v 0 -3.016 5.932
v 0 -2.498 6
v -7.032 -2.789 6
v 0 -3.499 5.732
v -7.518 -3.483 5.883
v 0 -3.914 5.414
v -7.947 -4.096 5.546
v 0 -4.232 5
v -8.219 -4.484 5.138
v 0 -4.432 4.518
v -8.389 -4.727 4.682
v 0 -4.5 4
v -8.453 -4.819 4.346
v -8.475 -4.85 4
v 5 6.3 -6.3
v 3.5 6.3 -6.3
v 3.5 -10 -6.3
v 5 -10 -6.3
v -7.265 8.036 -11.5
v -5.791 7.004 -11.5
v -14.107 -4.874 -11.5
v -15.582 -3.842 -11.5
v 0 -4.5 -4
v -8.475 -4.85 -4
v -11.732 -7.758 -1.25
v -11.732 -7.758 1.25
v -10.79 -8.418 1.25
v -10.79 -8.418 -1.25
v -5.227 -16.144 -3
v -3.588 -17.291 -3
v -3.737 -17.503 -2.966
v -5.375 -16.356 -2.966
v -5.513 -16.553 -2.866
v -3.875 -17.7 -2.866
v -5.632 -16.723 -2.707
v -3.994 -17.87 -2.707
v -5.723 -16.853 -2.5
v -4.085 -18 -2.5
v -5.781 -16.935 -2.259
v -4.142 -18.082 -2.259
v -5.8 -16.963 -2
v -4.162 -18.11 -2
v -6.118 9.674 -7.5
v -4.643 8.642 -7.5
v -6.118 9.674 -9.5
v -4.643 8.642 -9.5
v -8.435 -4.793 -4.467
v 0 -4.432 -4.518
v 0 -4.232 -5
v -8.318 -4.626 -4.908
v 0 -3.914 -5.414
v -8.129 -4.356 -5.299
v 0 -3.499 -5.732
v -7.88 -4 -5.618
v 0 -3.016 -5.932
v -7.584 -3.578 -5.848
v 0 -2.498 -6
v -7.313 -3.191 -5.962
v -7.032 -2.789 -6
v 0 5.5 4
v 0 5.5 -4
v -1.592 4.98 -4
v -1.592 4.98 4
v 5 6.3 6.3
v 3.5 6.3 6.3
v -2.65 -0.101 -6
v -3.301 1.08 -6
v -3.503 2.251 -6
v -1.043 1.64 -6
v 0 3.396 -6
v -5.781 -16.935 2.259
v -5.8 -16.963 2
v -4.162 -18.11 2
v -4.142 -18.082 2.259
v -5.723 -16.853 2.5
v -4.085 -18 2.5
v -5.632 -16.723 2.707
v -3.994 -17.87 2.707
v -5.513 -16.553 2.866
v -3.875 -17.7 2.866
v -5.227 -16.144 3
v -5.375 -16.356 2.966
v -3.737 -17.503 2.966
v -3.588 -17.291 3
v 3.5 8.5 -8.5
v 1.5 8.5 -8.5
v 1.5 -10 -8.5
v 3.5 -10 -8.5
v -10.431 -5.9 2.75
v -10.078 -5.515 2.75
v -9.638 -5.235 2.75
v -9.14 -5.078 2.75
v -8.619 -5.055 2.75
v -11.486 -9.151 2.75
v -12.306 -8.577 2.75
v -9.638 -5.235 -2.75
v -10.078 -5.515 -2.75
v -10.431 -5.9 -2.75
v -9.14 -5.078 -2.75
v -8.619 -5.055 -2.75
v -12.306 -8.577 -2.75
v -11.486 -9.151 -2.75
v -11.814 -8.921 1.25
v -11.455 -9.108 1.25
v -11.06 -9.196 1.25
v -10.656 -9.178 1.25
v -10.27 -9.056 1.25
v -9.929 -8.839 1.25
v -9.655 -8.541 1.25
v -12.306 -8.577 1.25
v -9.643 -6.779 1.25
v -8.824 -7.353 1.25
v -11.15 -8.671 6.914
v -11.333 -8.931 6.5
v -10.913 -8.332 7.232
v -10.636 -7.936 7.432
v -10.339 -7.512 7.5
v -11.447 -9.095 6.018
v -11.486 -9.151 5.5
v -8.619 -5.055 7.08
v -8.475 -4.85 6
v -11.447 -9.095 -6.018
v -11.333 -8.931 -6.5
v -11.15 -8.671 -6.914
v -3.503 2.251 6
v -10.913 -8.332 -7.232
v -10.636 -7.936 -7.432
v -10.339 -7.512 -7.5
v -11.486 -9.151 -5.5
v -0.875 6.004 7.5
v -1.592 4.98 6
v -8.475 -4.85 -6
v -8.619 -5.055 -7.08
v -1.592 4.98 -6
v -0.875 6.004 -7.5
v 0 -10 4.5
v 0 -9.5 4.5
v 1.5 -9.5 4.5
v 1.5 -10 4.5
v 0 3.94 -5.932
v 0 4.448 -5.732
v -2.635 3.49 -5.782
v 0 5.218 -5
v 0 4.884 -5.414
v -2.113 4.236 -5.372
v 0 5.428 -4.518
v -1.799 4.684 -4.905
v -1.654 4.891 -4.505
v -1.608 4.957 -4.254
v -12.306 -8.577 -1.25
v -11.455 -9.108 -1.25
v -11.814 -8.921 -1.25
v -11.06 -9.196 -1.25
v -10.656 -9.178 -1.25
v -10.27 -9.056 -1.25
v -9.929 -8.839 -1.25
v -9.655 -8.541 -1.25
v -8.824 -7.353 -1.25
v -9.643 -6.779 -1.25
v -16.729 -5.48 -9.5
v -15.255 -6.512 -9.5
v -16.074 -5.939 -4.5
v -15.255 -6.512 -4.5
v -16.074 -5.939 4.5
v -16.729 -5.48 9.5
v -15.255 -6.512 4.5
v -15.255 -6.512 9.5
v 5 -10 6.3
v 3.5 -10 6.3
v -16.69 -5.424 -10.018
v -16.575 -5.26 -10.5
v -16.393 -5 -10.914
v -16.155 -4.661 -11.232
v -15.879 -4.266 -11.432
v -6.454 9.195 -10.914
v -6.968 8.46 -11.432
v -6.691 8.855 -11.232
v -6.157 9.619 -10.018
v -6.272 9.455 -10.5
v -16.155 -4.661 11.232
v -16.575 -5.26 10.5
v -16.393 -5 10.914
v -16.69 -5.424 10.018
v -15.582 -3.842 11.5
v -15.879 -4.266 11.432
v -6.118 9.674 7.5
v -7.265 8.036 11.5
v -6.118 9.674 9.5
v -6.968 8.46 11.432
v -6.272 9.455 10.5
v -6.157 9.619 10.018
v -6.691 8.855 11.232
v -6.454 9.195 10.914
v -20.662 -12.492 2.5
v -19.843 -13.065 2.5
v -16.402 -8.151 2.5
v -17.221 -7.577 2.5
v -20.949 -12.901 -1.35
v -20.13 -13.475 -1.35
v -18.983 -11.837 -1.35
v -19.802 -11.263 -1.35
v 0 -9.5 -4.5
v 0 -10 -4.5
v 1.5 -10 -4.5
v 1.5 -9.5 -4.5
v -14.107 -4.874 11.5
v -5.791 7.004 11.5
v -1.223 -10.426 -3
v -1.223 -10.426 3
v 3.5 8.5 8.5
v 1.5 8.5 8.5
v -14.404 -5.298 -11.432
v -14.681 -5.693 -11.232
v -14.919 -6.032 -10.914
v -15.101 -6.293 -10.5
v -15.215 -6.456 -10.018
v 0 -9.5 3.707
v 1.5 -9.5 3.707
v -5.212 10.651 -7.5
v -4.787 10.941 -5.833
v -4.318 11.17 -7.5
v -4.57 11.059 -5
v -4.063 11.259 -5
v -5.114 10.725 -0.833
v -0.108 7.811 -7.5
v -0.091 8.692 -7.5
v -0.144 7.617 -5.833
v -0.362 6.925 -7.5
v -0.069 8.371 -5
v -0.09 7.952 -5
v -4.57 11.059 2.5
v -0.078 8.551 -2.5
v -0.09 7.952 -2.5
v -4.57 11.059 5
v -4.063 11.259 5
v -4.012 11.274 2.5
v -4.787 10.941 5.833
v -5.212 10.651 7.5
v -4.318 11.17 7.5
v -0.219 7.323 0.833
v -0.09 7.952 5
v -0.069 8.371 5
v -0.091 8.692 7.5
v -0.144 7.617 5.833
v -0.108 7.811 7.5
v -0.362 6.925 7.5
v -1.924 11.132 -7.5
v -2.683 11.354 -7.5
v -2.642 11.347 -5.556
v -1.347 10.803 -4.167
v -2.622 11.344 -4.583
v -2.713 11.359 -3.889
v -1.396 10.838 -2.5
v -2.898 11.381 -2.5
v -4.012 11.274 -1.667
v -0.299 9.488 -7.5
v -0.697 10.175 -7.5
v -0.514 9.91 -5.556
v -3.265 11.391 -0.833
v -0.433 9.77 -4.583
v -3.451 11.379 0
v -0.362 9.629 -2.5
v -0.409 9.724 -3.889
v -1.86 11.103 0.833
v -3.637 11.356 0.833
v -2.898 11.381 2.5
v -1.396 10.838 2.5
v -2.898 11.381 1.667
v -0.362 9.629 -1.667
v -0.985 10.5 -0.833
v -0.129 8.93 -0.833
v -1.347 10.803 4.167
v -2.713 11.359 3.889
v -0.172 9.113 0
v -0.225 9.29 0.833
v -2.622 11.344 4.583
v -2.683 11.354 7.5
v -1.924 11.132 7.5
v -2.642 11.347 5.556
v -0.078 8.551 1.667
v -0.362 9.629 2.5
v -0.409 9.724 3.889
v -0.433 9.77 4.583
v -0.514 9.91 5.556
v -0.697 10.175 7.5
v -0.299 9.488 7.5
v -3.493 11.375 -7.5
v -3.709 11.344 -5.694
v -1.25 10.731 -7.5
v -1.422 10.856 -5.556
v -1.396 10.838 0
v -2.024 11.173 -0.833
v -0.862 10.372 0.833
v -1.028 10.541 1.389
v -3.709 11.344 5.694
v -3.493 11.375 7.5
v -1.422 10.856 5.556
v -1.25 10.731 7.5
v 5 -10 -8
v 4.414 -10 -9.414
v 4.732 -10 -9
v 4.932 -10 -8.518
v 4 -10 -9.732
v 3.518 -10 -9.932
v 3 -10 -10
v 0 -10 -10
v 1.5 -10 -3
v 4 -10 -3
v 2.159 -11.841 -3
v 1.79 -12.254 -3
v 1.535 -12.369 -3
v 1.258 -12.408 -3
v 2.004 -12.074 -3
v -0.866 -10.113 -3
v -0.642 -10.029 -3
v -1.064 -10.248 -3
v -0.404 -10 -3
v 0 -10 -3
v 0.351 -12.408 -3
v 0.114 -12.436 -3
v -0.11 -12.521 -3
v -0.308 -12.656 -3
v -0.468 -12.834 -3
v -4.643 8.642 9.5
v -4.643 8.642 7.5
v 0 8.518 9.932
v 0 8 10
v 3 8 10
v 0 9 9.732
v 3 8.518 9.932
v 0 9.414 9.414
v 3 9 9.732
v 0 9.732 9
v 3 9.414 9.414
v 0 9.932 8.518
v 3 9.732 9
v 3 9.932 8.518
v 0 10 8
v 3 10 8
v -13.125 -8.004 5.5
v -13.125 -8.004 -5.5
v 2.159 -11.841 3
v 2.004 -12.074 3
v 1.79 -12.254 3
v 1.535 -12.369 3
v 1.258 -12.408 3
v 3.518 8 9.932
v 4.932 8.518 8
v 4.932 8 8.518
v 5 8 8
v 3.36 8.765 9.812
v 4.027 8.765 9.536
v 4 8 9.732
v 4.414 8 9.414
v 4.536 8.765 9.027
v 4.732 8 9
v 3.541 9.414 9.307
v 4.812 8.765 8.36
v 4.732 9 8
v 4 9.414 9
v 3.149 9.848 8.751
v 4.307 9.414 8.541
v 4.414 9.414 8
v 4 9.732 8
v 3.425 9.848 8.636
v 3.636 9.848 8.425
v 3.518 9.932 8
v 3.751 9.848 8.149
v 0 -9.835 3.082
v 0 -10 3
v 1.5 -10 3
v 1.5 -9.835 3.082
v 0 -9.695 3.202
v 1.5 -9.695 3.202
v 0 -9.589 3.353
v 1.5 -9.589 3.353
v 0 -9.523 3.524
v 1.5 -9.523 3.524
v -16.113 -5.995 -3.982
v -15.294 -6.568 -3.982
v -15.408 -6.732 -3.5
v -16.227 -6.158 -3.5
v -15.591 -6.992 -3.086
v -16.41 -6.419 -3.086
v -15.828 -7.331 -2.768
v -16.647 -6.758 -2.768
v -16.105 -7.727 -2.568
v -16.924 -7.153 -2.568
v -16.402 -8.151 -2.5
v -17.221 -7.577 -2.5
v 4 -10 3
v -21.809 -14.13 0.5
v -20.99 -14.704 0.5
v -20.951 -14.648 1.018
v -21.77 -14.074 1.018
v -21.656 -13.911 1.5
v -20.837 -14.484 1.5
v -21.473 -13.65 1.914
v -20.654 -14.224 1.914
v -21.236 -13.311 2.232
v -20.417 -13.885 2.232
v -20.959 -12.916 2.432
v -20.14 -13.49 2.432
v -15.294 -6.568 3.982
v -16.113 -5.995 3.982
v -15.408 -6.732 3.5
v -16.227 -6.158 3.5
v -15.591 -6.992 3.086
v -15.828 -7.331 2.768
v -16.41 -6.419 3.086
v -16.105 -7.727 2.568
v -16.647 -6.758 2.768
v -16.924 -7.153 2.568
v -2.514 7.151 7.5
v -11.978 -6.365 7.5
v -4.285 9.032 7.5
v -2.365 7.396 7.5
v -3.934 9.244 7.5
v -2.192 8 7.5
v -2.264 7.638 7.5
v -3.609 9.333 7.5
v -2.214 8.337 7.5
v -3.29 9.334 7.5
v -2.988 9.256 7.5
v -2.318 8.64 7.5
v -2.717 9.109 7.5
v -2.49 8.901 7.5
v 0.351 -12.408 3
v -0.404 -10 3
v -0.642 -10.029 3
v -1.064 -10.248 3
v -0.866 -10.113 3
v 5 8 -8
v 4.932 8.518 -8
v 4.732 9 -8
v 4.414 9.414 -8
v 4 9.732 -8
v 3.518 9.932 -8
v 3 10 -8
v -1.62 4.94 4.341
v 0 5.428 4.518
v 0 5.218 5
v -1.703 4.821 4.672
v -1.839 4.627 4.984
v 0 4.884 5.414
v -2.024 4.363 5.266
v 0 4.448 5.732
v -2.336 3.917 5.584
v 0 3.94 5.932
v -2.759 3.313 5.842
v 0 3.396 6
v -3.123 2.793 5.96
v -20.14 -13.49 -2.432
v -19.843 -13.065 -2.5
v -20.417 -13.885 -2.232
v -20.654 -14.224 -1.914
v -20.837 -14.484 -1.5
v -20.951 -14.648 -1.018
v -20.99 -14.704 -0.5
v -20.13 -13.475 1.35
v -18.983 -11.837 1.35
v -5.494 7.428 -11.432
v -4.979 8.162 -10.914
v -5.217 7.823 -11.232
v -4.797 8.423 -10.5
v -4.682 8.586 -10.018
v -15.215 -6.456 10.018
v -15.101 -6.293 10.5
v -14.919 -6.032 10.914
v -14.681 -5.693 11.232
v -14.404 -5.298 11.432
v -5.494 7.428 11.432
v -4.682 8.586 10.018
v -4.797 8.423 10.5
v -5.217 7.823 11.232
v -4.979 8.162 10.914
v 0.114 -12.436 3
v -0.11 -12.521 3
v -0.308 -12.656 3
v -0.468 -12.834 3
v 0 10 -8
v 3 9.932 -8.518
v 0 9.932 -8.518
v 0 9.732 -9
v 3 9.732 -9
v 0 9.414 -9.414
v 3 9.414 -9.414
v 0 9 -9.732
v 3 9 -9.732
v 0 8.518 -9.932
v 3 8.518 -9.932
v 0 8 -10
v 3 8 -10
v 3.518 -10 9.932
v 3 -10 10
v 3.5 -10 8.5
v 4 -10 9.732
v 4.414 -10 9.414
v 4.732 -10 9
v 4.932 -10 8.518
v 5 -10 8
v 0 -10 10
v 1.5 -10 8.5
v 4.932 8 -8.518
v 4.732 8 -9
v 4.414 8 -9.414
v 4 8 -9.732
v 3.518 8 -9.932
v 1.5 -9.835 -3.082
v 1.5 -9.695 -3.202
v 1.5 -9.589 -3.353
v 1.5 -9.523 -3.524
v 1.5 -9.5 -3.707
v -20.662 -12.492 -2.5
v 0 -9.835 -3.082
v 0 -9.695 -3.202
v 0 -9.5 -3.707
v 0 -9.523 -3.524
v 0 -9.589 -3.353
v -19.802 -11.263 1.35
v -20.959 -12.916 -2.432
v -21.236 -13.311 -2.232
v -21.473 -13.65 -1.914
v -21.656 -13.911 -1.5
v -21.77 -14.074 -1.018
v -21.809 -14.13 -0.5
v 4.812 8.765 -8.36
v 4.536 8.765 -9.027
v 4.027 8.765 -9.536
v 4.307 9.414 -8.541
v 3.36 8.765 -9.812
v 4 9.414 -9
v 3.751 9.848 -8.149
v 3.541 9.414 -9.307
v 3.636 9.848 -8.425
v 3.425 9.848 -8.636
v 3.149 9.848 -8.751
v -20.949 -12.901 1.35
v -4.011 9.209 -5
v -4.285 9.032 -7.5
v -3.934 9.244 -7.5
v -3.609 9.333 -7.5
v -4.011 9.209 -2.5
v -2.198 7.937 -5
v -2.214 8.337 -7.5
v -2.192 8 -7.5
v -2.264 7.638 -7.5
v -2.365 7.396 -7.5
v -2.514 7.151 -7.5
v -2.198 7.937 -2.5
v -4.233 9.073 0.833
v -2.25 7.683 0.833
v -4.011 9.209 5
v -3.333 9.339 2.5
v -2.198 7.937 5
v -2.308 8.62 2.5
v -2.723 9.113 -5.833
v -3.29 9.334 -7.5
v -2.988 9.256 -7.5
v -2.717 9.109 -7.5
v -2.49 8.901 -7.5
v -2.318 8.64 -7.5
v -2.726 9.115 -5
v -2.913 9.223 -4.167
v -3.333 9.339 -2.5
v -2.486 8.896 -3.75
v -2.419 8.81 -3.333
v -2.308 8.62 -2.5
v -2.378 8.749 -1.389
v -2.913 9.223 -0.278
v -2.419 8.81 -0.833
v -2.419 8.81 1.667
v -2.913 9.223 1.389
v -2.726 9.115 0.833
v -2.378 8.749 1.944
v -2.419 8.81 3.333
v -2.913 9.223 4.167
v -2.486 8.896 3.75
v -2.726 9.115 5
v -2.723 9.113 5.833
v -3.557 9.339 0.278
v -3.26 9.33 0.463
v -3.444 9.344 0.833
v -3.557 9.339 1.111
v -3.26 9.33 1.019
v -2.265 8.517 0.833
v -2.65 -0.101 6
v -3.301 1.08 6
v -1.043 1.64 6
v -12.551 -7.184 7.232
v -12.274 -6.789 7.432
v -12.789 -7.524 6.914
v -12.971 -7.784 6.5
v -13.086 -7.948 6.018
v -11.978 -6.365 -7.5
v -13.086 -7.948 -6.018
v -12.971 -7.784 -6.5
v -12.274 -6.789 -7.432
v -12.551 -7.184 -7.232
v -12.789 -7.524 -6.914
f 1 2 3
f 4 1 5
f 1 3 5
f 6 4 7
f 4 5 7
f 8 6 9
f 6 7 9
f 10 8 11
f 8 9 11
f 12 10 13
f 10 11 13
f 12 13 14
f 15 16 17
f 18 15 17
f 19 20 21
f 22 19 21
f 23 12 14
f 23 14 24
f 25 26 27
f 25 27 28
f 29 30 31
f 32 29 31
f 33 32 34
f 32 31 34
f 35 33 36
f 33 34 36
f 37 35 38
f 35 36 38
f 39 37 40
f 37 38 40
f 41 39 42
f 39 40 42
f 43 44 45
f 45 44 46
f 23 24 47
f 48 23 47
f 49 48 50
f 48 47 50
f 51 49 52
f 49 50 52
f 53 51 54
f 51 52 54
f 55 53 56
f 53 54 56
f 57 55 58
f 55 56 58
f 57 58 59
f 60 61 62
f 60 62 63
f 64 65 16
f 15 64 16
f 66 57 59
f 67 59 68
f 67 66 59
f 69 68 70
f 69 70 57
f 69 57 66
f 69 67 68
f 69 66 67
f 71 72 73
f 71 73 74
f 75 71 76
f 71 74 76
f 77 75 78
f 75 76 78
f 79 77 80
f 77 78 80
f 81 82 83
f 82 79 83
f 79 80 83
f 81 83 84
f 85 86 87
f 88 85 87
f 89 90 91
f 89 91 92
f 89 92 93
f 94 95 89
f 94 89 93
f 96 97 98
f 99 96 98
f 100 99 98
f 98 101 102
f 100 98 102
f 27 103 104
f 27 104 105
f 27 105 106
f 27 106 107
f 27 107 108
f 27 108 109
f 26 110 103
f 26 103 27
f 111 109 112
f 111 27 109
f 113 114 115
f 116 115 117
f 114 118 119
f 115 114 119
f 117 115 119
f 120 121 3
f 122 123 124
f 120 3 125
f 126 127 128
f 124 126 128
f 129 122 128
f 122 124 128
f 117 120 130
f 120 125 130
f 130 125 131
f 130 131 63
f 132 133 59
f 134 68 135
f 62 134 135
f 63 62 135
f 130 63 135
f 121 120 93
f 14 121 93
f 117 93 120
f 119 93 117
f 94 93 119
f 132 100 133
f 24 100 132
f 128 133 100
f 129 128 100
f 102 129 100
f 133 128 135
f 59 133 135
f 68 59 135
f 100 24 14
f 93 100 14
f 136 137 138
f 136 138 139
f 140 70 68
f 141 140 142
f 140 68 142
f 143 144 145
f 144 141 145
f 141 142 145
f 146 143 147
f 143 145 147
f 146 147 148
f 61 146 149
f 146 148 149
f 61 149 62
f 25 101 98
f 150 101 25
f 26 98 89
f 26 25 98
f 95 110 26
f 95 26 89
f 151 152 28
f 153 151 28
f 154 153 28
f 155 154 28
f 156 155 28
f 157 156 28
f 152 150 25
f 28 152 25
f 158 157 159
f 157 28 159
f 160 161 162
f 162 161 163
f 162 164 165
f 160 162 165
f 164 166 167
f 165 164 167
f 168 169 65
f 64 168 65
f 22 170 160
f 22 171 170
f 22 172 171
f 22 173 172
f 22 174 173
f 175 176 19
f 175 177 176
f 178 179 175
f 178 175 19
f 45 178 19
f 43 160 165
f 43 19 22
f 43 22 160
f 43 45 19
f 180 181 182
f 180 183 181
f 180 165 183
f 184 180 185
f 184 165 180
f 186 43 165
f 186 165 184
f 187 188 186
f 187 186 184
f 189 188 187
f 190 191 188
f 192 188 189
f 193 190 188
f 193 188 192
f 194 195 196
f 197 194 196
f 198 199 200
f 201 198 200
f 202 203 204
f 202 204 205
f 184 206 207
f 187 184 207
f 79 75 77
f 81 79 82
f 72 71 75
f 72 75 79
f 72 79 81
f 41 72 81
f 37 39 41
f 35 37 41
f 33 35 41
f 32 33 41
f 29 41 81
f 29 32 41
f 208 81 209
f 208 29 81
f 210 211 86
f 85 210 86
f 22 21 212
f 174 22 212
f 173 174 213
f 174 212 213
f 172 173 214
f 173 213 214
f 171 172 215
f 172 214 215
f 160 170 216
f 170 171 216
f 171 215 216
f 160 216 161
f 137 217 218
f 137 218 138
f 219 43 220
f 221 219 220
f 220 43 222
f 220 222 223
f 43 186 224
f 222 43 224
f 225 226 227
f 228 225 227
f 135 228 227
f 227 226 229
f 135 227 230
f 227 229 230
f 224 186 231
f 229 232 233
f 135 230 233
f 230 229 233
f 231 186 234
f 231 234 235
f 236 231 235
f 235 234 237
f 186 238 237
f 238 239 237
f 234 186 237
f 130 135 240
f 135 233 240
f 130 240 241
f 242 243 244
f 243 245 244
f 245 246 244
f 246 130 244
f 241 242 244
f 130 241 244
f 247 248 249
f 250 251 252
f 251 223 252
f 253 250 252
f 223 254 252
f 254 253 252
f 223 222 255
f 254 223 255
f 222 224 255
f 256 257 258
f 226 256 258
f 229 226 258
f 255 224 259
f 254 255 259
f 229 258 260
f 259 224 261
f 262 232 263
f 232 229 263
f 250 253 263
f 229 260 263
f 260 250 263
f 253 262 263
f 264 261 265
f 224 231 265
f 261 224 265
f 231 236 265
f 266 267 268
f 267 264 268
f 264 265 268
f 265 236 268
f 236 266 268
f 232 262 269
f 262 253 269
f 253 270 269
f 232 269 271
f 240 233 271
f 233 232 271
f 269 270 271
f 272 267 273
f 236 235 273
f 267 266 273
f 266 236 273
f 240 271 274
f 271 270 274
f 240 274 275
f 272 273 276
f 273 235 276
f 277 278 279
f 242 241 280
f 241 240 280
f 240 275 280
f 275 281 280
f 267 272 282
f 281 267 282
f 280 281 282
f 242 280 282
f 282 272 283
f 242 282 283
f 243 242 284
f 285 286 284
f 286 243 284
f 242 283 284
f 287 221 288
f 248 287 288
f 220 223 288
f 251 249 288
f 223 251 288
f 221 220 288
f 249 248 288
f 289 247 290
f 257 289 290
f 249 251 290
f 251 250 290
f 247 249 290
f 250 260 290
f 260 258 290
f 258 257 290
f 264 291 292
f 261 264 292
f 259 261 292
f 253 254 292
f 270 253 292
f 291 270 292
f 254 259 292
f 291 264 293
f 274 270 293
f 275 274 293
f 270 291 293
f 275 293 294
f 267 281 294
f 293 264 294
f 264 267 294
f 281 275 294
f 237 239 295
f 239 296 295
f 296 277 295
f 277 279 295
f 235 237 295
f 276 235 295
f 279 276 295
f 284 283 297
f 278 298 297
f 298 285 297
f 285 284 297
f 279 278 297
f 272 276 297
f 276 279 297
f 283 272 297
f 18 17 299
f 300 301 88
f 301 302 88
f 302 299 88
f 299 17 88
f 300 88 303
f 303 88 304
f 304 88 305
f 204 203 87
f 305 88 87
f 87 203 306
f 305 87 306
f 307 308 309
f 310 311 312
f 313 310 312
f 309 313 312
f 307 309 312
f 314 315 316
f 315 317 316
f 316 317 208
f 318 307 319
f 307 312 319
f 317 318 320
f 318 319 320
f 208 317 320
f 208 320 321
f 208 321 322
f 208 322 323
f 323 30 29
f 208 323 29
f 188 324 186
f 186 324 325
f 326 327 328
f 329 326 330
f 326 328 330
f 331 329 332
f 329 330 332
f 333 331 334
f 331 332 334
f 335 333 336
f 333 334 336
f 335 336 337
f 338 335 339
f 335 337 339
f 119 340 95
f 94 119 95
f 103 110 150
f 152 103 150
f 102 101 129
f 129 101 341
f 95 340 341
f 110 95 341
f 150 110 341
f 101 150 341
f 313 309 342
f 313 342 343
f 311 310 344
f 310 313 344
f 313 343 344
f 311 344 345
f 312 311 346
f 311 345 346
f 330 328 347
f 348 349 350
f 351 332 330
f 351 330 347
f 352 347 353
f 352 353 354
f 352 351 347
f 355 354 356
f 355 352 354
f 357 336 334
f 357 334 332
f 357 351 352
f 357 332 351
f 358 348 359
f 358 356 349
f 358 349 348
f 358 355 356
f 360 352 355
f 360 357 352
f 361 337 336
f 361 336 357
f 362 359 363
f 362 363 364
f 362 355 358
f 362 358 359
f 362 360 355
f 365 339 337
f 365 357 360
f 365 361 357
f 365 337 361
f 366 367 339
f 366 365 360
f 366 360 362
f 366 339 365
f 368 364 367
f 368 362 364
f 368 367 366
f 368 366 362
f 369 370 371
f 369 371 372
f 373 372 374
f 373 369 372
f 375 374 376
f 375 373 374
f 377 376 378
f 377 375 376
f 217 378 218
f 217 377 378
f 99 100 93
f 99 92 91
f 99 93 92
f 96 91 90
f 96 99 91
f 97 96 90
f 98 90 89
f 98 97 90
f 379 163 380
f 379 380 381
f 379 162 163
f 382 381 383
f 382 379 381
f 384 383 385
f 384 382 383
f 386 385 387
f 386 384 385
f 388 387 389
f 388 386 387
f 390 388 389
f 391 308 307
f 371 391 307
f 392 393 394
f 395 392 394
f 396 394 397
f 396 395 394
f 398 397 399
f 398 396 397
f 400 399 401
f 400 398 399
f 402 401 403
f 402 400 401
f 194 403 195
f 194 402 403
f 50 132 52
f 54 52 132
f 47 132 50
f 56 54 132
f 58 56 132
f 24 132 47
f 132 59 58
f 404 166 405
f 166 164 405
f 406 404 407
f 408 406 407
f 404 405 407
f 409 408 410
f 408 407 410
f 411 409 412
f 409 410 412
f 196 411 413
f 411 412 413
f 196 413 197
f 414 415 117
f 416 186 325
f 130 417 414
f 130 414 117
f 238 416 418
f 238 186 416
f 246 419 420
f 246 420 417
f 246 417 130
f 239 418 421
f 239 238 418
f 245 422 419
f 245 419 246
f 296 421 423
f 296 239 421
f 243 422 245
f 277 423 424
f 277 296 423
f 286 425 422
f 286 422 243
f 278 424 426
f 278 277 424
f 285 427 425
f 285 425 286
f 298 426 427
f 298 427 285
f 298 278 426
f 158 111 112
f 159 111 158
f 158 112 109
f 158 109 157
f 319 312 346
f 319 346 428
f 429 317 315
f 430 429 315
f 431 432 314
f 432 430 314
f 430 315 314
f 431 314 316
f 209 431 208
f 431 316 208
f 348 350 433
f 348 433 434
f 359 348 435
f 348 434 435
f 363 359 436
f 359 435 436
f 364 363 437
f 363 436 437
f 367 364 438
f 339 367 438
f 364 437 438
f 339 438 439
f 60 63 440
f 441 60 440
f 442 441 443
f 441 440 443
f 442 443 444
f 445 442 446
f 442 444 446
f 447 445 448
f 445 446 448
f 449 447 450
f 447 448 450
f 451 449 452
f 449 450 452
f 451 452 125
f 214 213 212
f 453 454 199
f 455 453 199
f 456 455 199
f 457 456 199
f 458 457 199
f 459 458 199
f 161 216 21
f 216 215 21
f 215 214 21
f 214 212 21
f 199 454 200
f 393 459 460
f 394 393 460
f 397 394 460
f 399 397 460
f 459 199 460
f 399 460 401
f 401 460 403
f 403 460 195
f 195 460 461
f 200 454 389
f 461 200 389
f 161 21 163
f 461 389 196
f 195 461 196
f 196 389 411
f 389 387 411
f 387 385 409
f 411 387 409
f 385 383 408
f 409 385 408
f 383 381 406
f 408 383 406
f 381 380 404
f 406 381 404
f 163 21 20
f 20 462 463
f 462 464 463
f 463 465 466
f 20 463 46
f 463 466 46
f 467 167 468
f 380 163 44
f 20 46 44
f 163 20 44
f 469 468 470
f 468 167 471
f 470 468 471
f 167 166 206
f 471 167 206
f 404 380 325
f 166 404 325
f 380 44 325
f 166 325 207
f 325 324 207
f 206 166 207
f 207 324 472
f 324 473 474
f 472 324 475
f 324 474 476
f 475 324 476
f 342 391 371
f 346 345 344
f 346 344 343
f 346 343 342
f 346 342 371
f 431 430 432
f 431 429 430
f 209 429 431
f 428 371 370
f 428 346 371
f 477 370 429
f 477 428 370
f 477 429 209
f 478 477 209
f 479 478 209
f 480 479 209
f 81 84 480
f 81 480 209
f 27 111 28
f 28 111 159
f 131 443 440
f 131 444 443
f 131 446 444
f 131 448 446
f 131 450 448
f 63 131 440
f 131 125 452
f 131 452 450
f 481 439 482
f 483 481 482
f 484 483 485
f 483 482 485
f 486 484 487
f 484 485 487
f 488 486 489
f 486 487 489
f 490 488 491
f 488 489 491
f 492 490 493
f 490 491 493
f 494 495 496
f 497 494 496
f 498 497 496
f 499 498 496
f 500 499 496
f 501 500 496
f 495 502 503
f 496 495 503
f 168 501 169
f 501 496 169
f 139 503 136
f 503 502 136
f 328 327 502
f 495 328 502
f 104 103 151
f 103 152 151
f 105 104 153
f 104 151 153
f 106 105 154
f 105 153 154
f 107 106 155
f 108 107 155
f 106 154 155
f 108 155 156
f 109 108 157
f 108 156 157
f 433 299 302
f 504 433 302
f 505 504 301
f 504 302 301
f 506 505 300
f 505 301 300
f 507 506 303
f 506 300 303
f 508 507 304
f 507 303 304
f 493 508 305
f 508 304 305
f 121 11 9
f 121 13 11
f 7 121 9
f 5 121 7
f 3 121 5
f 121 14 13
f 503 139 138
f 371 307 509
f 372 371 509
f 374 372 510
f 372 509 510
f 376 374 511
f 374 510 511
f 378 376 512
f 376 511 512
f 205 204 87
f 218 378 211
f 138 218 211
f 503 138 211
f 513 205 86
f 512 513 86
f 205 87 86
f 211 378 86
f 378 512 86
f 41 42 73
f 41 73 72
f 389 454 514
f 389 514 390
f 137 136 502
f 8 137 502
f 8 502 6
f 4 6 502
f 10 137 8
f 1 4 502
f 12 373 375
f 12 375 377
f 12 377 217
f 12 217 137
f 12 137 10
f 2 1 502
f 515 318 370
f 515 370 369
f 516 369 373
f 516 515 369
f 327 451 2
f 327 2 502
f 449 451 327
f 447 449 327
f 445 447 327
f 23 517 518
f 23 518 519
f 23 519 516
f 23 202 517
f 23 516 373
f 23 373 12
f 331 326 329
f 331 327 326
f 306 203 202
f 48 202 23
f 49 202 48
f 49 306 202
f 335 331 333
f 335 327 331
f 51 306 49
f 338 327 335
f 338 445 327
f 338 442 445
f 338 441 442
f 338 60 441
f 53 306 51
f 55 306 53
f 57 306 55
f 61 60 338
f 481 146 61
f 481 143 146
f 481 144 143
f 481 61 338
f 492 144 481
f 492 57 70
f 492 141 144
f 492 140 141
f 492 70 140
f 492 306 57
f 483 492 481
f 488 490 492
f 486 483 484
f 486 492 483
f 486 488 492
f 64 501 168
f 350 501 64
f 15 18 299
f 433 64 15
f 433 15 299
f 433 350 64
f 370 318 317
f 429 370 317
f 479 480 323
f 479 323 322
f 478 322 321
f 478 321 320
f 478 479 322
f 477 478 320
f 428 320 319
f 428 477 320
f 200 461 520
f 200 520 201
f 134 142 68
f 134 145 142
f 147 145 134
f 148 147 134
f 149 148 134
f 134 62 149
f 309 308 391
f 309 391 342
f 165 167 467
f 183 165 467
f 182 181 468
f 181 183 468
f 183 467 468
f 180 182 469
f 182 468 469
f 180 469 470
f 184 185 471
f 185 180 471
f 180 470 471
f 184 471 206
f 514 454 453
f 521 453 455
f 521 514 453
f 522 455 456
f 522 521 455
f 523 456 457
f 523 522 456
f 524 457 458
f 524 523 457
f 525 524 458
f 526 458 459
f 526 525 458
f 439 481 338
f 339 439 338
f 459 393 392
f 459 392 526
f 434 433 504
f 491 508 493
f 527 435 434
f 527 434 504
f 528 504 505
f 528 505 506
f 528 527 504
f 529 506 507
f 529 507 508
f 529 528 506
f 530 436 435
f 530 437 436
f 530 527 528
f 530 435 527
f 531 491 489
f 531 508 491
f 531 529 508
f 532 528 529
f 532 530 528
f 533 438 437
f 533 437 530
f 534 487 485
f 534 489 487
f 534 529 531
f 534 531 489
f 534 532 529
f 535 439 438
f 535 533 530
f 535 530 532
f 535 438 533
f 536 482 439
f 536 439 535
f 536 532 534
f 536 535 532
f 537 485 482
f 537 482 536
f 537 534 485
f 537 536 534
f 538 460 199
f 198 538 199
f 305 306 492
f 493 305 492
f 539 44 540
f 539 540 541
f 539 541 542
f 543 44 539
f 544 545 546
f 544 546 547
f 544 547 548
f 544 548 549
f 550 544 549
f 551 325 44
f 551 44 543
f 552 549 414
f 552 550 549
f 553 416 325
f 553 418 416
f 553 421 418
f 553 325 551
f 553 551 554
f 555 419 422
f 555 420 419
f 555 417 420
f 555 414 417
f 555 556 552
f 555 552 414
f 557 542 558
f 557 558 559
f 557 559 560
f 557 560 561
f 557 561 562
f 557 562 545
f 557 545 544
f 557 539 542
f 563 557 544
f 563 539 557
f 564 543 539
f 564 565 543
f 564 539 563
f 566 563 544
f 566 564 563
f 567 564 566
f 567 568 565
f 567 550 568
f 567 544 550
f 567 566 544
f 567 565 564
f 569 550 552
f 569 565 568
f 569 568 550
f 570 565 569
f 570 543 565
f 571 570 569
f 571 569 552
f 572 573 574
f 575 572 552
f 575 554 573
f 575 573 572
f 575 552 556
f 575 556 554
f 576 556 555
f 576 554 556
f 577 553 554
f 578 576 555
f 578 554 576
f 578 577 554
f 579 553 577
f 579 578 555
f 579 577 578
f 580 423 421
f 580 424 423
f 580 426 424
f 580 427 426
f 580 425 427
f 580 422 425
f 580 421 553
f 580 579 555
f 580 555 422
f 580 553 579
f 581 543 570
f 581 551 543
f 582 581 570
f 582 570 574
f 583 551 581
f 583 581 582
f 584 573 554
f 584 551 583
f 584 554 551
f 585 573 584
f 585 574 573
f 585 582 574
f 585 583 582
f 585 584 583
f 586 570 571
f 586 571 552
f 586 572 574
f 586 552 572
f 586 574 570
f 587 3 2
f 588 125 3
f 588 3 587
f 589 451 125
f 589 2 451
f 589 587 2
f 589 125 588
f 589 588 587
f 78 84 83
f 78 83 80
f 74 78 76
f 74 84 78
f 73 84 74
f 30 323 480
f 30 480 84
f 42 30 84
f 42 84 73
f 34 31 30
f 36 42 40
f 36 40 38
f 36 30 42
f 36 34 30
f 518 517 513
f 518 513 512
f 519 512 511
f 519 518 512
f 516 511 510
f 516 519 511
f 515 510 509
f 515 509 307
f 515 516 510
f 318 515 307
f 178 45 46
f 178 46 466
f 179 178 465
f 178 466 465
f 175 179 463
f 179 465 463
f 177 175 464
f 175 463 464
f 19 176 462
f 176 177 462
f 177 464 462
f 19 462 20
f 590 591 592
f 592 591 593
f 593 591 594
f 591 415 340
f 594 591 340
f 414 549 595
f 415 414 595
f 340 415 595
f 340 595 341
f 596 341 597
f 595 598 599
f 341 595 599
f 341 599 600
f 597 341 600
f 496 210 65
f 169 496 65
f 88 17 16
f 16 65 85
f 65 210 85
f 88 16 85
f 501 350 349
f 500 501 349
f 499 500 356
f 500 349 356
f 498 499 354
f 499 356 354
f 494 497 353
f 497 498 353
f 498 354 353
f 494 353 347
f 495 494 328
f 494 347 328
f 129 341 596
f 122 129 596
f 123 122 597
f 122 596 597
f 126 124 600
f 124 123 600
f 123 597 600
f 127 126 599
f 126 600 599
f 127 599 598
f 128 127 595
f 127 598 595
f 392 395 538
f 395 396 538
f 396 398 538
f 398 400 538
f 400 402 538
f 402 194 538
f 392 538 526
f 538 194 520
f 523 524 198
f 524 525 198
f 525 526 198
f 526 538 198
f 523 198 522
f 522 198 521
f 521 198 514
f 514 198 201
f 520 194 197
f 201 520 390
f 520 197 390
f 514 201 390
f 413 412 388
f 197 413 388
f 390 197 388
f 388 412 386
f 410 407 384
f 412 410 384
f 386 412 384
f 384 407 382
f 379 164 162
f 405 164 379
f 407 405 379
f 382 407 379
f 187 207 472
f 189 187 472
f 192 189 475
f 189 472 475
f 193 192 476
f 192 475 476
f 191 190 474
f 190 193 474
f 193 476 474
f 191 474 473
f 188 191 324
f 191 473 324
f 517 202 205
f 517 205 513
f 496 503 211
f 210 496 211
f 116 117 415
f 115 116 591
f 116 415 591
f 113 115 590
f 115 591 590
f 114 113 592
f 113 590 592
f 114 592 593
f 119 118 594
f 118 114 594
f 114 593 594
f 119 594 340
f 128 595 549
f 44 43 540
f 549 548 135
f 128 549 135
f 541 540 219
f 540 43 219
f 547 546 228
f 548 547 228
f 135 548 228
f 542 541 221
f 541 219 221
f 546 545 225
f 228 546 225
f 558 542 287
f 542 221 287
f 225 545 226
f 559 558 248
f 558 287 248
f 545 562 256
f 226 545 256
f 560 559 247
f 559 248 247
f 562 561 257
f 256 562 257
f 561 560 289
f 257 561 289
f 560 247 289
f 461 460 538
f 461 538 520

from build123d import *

# Parameters (mm, degrees)
BOSS_EXTRUDE1_DEPTH      = 1.5
FILLET7_R                = 0.75
BOSS_EXTRUDE2_DEPTH      = 2
BOSS_EXTRUDE3_DEPTH      = 1.5
BOSS_EXTRUDE5_DEPTH      = 3
BOSS_EXTRUDE5_DEPTH_BACK = 3
BOSS_EXTRUDE4_DEPTH      = 7.5
BOSS_EXTRUDE4_DEPTH_BACK = 7.5
BOSS_EXTRUDE6_DEPTH      = 1.8
BOSS_EXTRUDE7_DEPTH      = 15
SKETCH18_W               = 1
SKETCH18_H               = 5.5
CUT_EXTRUDE2_DEPTH       = 5
FILLET8_R                = 2
SKETCH14_W               = 2.5
SKETCH14_H               = 1
BOSS_EXTRUDE9_DEPTH      = 1.15
SKETCH16_W               = 2.5
SKETCH16_H               = 3
BOSS_EXTRUDE11_DEPTH     = 1
SKETCH15_W               = 5
SKETCH15_H               = 10
SKETCH15_W_2             = 2.7
SKETCH15_H_2             = 2
BOSS_EXTRUDE10_DEPTH     = 1
FILLET2_R                = 1
FILLET3_R                = 2
FILLET4_R                = 2
FILLET5_R                = 1.55


with BuildPart() as part:
    # Sketch1 → Boss-Extrude1 (new body)
    with BuildSketch(Plane(origin=(0, 0, 0), x_dir=(0, 0, -1), z_dir=(1, 0, 0))):
        Polygon((-10, -10), (-10, 10), (10, 10), (10, -10), (4.5, -10), (4.5, -9.5), (3, -9.5), (3, -10), (-3, -10), (-3, -9.5), (-4.5, -9.5), (-4.5, -10), align=None)
    extrude(amount=BOSS_EXTRUDE1_DEPTH)

    # Fillet7
    # the kernel refuses this fillet: 0.75 mm, written as the material it adds along each edge
    with BuildSketch(Plane(origin=(0, -9.5, -3), x_dir=(0, 0, -1), z_dir=(1, 0, 0))) as fillet7_piece_1:
        with BuildLine():
            CenterArc((0.707106781, -0.75), FILLET7_R, 90, 70.528779366)
            Line((0, -0.5), (-0.014142136, -0.495))
            ThreePointArc((-0.014142136, -0.495), (-0.015, -0.25), (-0.015, 0))
            Line((-0.015, 0), (0, 0.015))
            Line((0, 0.015), (0.707106781, 0.015))
            Line((0.707106781, 0.015), (0.707106781, 0))
        make_face()
    extrude(amount=1.5)
    with BuildSketch(Plane(origin=(0, -9.5, 3), x_dir=(0, -1, 0), z_dir=(1, 0, 0))) as fillet7_piece_2:
        with BuildLine():
            CenterArc((0.75, -0.707106781), FILLET7_R, 109.471220634, 70.528779366)
            Line((0, -0.707106781), (-0.015, -0.707106781))
            Line((-0.015, -0.707106781), (-0.015, 0))
            Line((-0.015, 0), (0, 0.015))
            ThreePointArc((0, 0.015), (0.25, 0.015), (0.495, 0.014142136))
            Line((0.495, 0.014142136), (0.5, 0))
        make_face()
    extrude(amount=1.5)

    # Sketch3 → Boss-Extrude2 (add)
    with BuildSketch(Plane(origin=(1.5, 0, 0), x_dir=(0, 0, -1), z_dir=(1, 0, 0))):
        Polygon((-10, 10), (-10, -10), (-8.5, -10), (-8.5, 8.5), (8.5, 8.5), (8.5, -10), (10, -10), (10, 10), align=None)
    extrude(amount=BOSS_EXTRUDE2_DEPTH)

    # Sketch5 → Boss-Extrude3 (add)
    with BuildSketch(Plane(origin=(3.5, 0, 0), x_dir=(0, 0, -1), z_dir=(1, 0, 0))):
        Polygon((-10, 10), (-10, -10), (-6.3, -10), (-6.3, 6.3), (6.3, 6.3), (6.3, -10), (10, -10), (10, 10), align=None)
    extrude(amount=BOSS_EXTRUDE3_DEPTH)

    # Sketch9 → Boss-Extrude5 (add, two sides: drawn at the far end of the back side and taken through both)
    with BuildSketch(Plane.XY.offset(-BOSS_EXTRUDE5_DEPTH_BACK)):
        Polygon((0, -10), (4, -10), (2.158934381, -11.841065619), (2.158934381, -12.407832924), (-0.169277933, -12.407832924), (-4.161939967, -18.109945249), (-5.800244055, -16.962792376), (-0.924844346, -10), align=None)
    extrude(amount=BOSS_EXTRUDE5_DEPTH + BOSS_EXTRUDE5_DEPTH_BACK)



with BuildPart() as body_2:
    # Sketch6 → Boss-Extrude4 (new, two sides: drawn at the far end of the back side and taken through both)
    with BuildSketch(Plane.XY.offset(-BOSS_EXTRUDE4_DEPTH_BACK)):
        Polygon((-13.124734081, -8.003579973), (-11.486429992, -9.150732846), (-0.875265919, 6.003579973), (-2.513570008, 7.150732846), align=None)
    extrude(amount=BOSS_EXTRUDE4_DEPTH + BOSS_EXTRUDE4_DEPTH_BACK)


with BuildPart() as part_1:
    add(part.part)

    add(body_2.part)  # Loft1 merges body 2
    # Sketch7 → Loft1 section 0
    with BuildSketch(Plane(origin=(-3.408072147, 2.386357808, 0), x_dir=(0, 0, -1), z_dir=(0.8191520442889888, -0.5735764363510506, 0))):
        with BuildLine():
            Line((-6, -8.834187099), (6, -8.834187099))
            Line((6, -8.834187099), (6, 3.165812901))
            Line((6, 3.165812901), (-6, 3.165812901))
            Line((-6, 3.165812901), (-6, -8.834187099))
        make_face()
    # Sketch8 → Loft1 section 1
    with BuildSketch(Plane.ZY):
        with BuildLine():
            Line((-6, -4.5), (6, -4.5))
            Line((6, -4.5), (6, 5.5))
            Line((6, 5.5), (-6, 5.5))
            Line((-6, 5.5), (-6, -4.5))
        make_face()
    loft()



with BuildPart() as body_2_2:
    # Sketch11 → Boss-Extrude6 (new body)
    with BuildSketch(Plane(origin=(-7.176171551, 5.024809415, 0), x_dir=(0, 0, 1), z_dir=(-0.8191520442889889, 0.5735764363510503, 0))):
        Polygon((-11.5, -14.084187099), (-4, -14.084187099), (11.5, -14.084187099), (11.5, 4.415812901), (-11.5, 4.415812901), align=None)
    extrude(amount=BOSS_EXTRUDE6_DEPTH)


with BuildPart() as part_2:
    add(part_1.part)

    add(body_2_2.part)  # Boss-Extrude7 merges body 2 2
    # Sketch12 → Boss-Extrude7 (add)
    with BuildSketch(Plane.XY.offset(7.5)):
        with BuildLine():
            Line((-6.117839003, 9.674469166), (-4.643365323, 8.642031581))
            add(Edge.make_bspline(
                [(-4.643365323, 8.642031581), (-3.504863732, 10.267980359), (-1.377538094, 8.77315456), (-2.513570008, 7.150732846)],
                knots=[0, 0, 0, 0, 1, 1, 1, 1], degree=3))
            Line((-2.513570008, 7.150732846), (-0.875265919, 6.003579973))
            add(Edge.make_bspline(
                [(-6.117839003, 9.674469166), (-3.343598781, 13.636494809), (1.950701407, 10.039479578), (-0.875265919, 6.003579973)],
                knots=[0, 0, 0, 0, 1, 1, 1, 1], degree=3))
        make_face()
    extrude(amount=-BOSS_EXTRUDE7_DEPTH)

    # Sketch18 → Cut-Extrude2 (cut)
    with BuildSketch(Plane(origin=(-8.078357845, -11.537090654, 0), x_dir=(0.8191520442889898, -0.5735764363510492, 0), z_dir=(-0.573576436351049, -0.8191520442889897, 0))):
        with Locations((-4.660487874, 0)):
            Rectangle(SKETCH18_W, SKETCH18_H)
    extrude(amount=-CUT_EXTRUDE2_DEPTH, mode=Mode.SUBTRACT)

    # Fillet8
    # the kernel refuses this fillet: 2 mm, written as the material it adds along each edge
    with BuildSketch(Plane(origin=(-9.437699854, -4.481396188, -7.080127019), x_dir=(0.8191520442889484, -0.5735764363511082, 0), z_dir=(0, 0, 1))) as fillet8_piece_1:
        with BuildLine():
            CenterArc((2, -1.732050808), FILLET8_R, 120, 60)
            Line((0, -1.732050808), (-0.04, -1.732050808))
            Line((-0.04, -1.732050808), (-0.04, 0))
            Line((-0.04, 0), (0, 0.04))
            ThreePointArc((0, 0.04), (0.5, 0.04), (0.98, 0.034641016))
            Line((0.98, 0.034641016), (1, 0))
        make_face()
    extrude(amount=14.160254038)

    # Sketch14 → Boss-Extrude9 (add)
    with BuildSketch(Plane(origin=(-4.227224191, 2.959934244, 0), x_dir=(0, 0, -1), z_dir=(0.8191520442889896, -0.5735764363510492, 0))):
        with Locations((0, -13.584187099)):
            Rectangle(SKETCH14_W, SKETCH14_H)
    extrude(amount=BOSS_EXTRUDE9_DEPTH)

    # Sketch16 → Boss-Extrude11 (add)
    with BuildSketch(Plane(origin=(-3.28519934, 2.300321343, 0), x_dir=(0, 0, -1), z_dir=(0.8191520442889892, -0.5735764363510499, 0))):
        with Locations((0, -12.584187099)):
            Rectangle(SKETCH16_W, SKETCH16_H)
    extrude(amount=BOSS_EXTRUDE11_DEPTH)

    # Sketch15 → Boss-Extrude10 (add)
    with BuildSketch(Plane(origin=(-7.176171551, 5.024809415, 0), x_dir=(0, 0, -1), z_dir=(0.8191520442889889, -0.5735764363510503, 0))):
        with Locations((0, -19.084187099)):
            Rectangle(SKETCH15_W, SKETCH15_H)
        with Locations((0, -21.584187099)):
            Rectangle(SKETCH15_W_2, SKETCH15_H_2, mode=Mode.SUBTRACT)
    extrude(amount=-BOSS_EXTRUDE10_DEPTH)

    # Fillet2
    # the kernel refuses this fillet: 1 mm, written as the material it adds along each edge
    with BuildSketch(Plane(origin=(-0.169277933, -12.407832924, 3), x_dir=(1, 0, 0), z_dir=(0, 0, -1))) as fillet2_piece_1:
        with BuildLine():
            CenterArc((FILLET2_R * 0.520567050552, FILLET2_R), FILLET2_R, 215, 55)
            Line((-FILLET2_R * 0.298584993737, FILLET2_R * 0.426423563649), (0, 0))
            Line((0, 0), (FILLET2_R * 0.520567050552, 0))
        make_face()
    extrude(amount=6)
    # the kernel refuses this fillet: 1 mm, written as the material it takes off along each edge
    with BuildSketch(Plane(origin=(2.158934381, -12.407832924, 5.253205262), x_dir=(0, 1, 0), z_dir=(0, 0, -1))) as fillet2_2_piece_1:
        with BuildLine():
            CenterArc((1, -0.901282105), FILLET2_R, 115.672890719, 64.327109281)
            Line((0, -0.901282105), (0, 0))
            Line((0, 0), (0.566767305, 0))
        make_face()
    extrude(amount=10.506410523, mode=Mode.SUBTRACT)
    with BuildSketch(Plane(origin=(-2.114059856, -19.54388634, -3), x_dir=(0.5735764363510425, 0.8191520442889944, 0), z_dir=(-0.8191520442889945, 0.5735764363510425, 0))) as fillet2_2_piece_2:
        with BuildLine():
            CenterArc((FILLET2_R, -FILLET2_R), FILLET2_R, 90, 90)
            Line((0, -FILLET2_R), (0, 0))
            Line((0, 0), (FILLET2_R, 0))
        make_face()
    extrude(amount=7, mode=Mode.SUBTRACT)
    with BuildSketch(Plane(origin=(-2.114059856, -19.54388634, 3), x_dir=(0.5735764363510425, 0.8191520442889944, 0), z_dir=(-0.8191520442889945, 0.5735764363510425, 0))) as fillet2_2_piece_3:
        with BuildLine():
            CenterArc((FILLET2_R, FILLET2_R), FILLET2_R, 180, 90)
            Line((0, FILLET2_R), (0, 0))
            Line((0, 0), (FILLET2_R, 0))
        make_face()
    extrude(amount=7, mode=Mode.SUBTRACT)
    with BuildSketch(Plane(origin=(-0.924844346, -10, -4.301417626), x_dir=(1, 0, 0), z_dir=(0, 0, 1))) as fillet2_2_piece_4:
        with BuildLine():
            CenterArc((FILLET2_R * 0.520567050552, -FILLET2_R), FILLET2_R, 90, 55)
            Line((-FILLET2_R * 0.298584993737, -FILLET2_R * 0.426423563649), (0, 0))
            Line((0, 0), (FILLET2_R * 0.520567050552, 0))
        make_face()
    extrude(amount=8.602835253, mode=Mode.SUBTRACT)

    # Fillet3
    fillet3_edges = [part_2.edges().sort_by_distance(p)[0] for p in [
        (-21.399869781, -14.417013464, 2.5),
        (-15.664105418, -6.225493021, 2.5),
        (-15.664105418, -6.225493021, -2.5),
        (-21.399869781, -14.417013464, -2.5),
    ]]
    fillet(fillet3_edges, radius=FILLET3_R)

    # Fillet4
    # the kernel refuses this fillet: 2 mm, written as the material it takes off along each edge
    with BuildSketch(Plane(origin=(3, 8, 8), x_dir=(0, 0, 1), z_dir=(0, 1, 0))) as fillet4_piece_1_section:
        Polygon((0, 0), (FILLET4_R * 1.02, 0), (FILLET4_R * 1.02, FILLET4_R * 1.02), (0, FILLET4_R * 1.02), align=None)
    fillet4_piece_1 = extrude(amount=FILLET4_R * 1.02, mode=Mode.PRIVATE)
    fillet4_piece_1 = fillet4_piece_1 - Plane(origin=(3, 8, 8), x_dir=(-0.7071067811865475, 0, -0.7071067811865475), z_dir=(0, 1, 0)) * Sphere(FILLET4_R, mode=Mode.PRIVATE)
    add(fillet4_piece_1, mode=Mode.SUBTRACT)
    with BuildSketch(Plane(origin=(3, 8, -8), x_dir=(0, 0, -1), z_dir=(0, 1, 0))) as fillet4_piece_2_section:
        Polygon((0, 0), (FILLET4_R * 1.02, 0), (FILLET4_R * 1.02, -FILLET4_R * 1.02), (0, -FILLET4_R * 1.02), align=None)
    fillet4_piece_2 = extrude(amount=FILLET4_R * 1.02, mode=Mode.PRIVATE)
    fillet4_piece_2 = fillet4_piece_2 - Plane(origin=(3, 8, -8), x_dir=(-0.7071067811865475, 0, 0.7071067811865475), z_dir=(0, 1, 0)) * Sphere(FILLET4_R, mode=Mode.PRIVATE)
    add(fillet4_piece_2, mode=Mode.SUBTRACT)
    with BuildSketch(Plane(origin=(5, 8, 10), x_dir=(0, 0, -1), z_dir=(0, -1, 0))) as fillet4_piece_3:
        with BuildLine():
            CenterArc((FILLET4_R, -FILLET4_R), FILLET4_R, 90, 90)
            Line((0, -FILLET4_R), (0, 0))
            Line((0, 0), (FILLET4_R, 0))
        make_face()
    extrude(amount=23, mode=Mode.SUBTRACT)
    with BuildSketch(Plane(origin=(5, 10, -8), x_dir=(0, -1, 0), z_dir=(0, 0, 1))) as fillet4_piece_4:
        with BuildLine():
            CenterArc((FILLET4_R, -FILLET4_R), FILLET4_R, 90, 90)
            Line((0, -FILLET4_R), (0, 0))
            Line((0, 0), (FILLET4_R, 0))
        make_face()
    extrude(amount=16, mode=Mode.SUBTRACT)
    with BuildSketch(Plane(origin=(5, -15, -10), x_dir=(-1, 0, 0), z_dir=(0, 1, 0))) as fillet4_piece_5:
        with BuildLine():
            CenterArc((FILLET4_R, FILLET4_R), FILLET4_R, 180, 90)
            Line((0, FILLET4_R), (0, 0))
            Line((0, 0), (FILLET4_R, 0))
        make_face()
    extrude(amount=23, mode=Mode.SUBTRACT)
    with BuildSketch(Plane(origin=(3, 10, -10), x_dir=(0, -1, 0), z_dir=(-1, 0, 0))) as fillet4_piece_6_section:
        with BuildLine():
            CenterArc((FILLET4_R, FILLET4_R), FILLET4_R, 180, 90)
            Line((0, FILLET4_R), (0, 0))
            Line((0, 0), (FILLET4_R, 0))
        make_face()
    fillet4_piece_6 = extrude(amount=8, mode=Mode.PRIVATE)
    fillet4_piece_6 = split(fillet4_piece_6, bisect_by=Plane(origin=(-0.152626661, 5.497582517, -10), z_dir=(0.5735764363510504, 0.8191520442889889, 0)), keep=Keep.TOP, mode=Mode.PRIVATE)
    add(fillet4_piece_6, mode=Mode.SUBTRACT)
    with BuildSketch(Plane(origin=(3, 10, 10), x_dir=(0, 0, -1), z_dir=(-1, 0, 0))) as fillet4_piece_7_section:
        with BuildLine():
            CenterArc((FILLET4_R, FILLET4_R), FILLET4_R, 180, 90)
            Line((0, FILLET4_R), (0, 0))
            Line((0, 0), (FILLET4_R, 0))
        make_face()
    fillet4_piece_7 = extrude(amount=8, mode=Mode.PRIVATE)
    fillet4_piece_7 = split(fillet4_piece_7, bisect_by=Plane(origin=(-0.152626661, 5.497582517, 10), z_dir=(0.5735764363510504, 0.8191520442889889, 0)), keep=Keep.TOP, mode=Mode.PRIVATE)
    add(fillet4_piece_7, mode=Mode.SUBTRACT)
    with BuildSketch(Plane(origin=(-0.547605102, 5.774149399, -11.5), x_dir=(0, 0, 1), z_dir=(-0.8191520442889889, 0.5735764363510504, 0)), Plane(origin=(-11.158769174, -9.380163421, -11.5), x_dir=(0.5735764363510504, 0.8191520442889889, 0), z_dir=(-0.8191520442889889, 0.5735764363510504, 0)), Plane(origin=(-0.547605102, 5.774149399, 11.5), x_dir=(-0.5735764363510504, -0.8191520442889888, 0), z_dir=(-0.8191520442889889, 0.5735764363510504, 0))) as fillet4_piece_8:
        with BuildLine():
            CenterArc((FILLET4_R, -FILLET4_R), FILLET4_R, 90, 90)
            Line((0, -FILLET4_R), (0, 0))
            Line((0, 0), (FILLET4_R, 0))
        make_face()
    extrude(amount=11.8, mode=Mode.SUBTRACT)
    with BuildSketch(Plane(origin=(-11.158769174, -9.380163421, 11.5), x_dir=(0.5735764363510504, 0.8191520442889888, 0), z_dir=(-0.8191520442889889, 0.5735764363510504, 0))) as fillet4_piece_9:
        with BuildLine():
            CenterArc((FILLET4_R, FILLET4_R), FILLET4_R, 180, 90)
            Line((0, FILLET4_R), (0, 0))
            Line((0, 0), (FILLET4_R, 0))
        make_face()
    extrude(amount=11.8, mode=Mode.SUBTRACT)
    with BuildSketch(Plane(origin=(-6.344870663, 3.426427706, -6), x_dir=(0.310642442370597, -0.9505268397041876, 0), z_dir=(0.9505268397041876, 0.310642442370597, 0))) as fillet4_piece_10_section:
        with BuildLine():
            CenterArc((FILLET4_R, -FILLET4_R), FILLET4_R, 90, 90)
            Line((0, -FILLET4_R), (0, 0))
            Line((0, 0), (FILLET4_R, 0))
        make_face()
    fillet4_piece_10 = extrude(amount=11.675109422, mode=Mode.PRIVATE)
    fillet4_piece_10 = split(fillet4_piece_10, bisect_by=Plane(origin=(-3.885576276, 1.704411238, -6), z_dir=(0.8191520442889891, -0.5735764363510499, 0)), keep=Keep.TOP, mode=Mode.PRIVATE)
    fillet4_piece_10 = split(fillet4_piece_10, bisect_by=Plane(origin=(0, 3.426427706, -6), z_dir=(-1, 0, 0)), keep=Keep.TOP, mode=Mode.PRIVATE)
    add(fillet4_piece_10, mode=Mode.SUBTRACT)
    with BuildSketch(Plane(origin=(-6.344870663, 3.426427706, 6), x_dir=(0, 0, -1), z_dir=(0.9505268397041876, 0.3106424423705969, 0))) as fillet4_piece_11_section:
        with BuildLine():
            CenterArc((FILLET4_R, -FILLET4_R), FILLET4_R, 90, 90)
            Line((0, -FILLET4_R), (0, 0))
            Line((0, 0), (FILLET4_R, 0))
        make_face()
    fillet4_piece_11 = extrude(amount=11.675109422, mode=Mode.PRIVATE)
    fillet4_piece_11 = split(fillet4_piece_11, bisect_by=Plane(origin=(-3.885576276, 1.704411238, 6), z_dir=(0.8191520442889891, -0.5735764363510499, 0)), keep=Keep.TOP, mode=Mode.PRIVATE)
    fillet4_piece_11 = split(fillet4_piece_11, bisect_by=Plane(origin=(0, 3.426427706, 6), z_dir=(-1, 0, 0)), keep=Keep.TOP, mode=Mode.PRIVATE)
    add(fillet4_piece_11, mode=Mode.SUBTRACT)
    with BuildSketch(Plane(origin=(-13.470891015, -5.056603329, -6), x_dir=(-0.041283743098950804, 0.9991474628680893, 0), z_dir=(0.9991474628680892, 0.0412837430989508, 0))) as fillet4_piece_12_section:
        with BuildLine():
            CenterArc((FILLET4_R, FILLET4_R), FILLET4_R, 180, 90)
            Line((0, FILLET4_R), (0, 0))
            Line((0, 0), (FILLET4_R, 0))
        make_face()
    fillet4_piece_12 = extrude(amount=18.48238525, mode=Mode.PRIVATE)
    fillet4_piece_12 = split(fillet4_piece_12, bisect_by=Plane(origin=(-10.215686034, -7.335922395, -6), z_dir=(0.8191520442889891, -0.5735764363510499, 0)), keep=Keep.TOP, mode=Mode.PRIVATE)
    fillet4_piece_12 = split(fillet4_piece_12, bisect_by=Plane(origin=(0, -5.056603329, -6), z_dir=(-1, 0, 0)), keep=Keep.TOP, mode=Mode.PRIVATE)
    add(fillet4_piece_12, mode=Mode.SUBTRACT)
    with BuildSketch(Plane(origin=(-13.470891015, -5.056603329, 6), x_dir=(0, 0, -1), z_dir=(0.9991474628680892, 0.0412837430989508, 0))) as fillet4_piece_13_section:
        with BuildLine():
            CenterArc((FILLET4_R, FILLET4_R), FILLET4_R, 180, 90)
            Line((0, FILLET4_R), (0, 0))
            Line((0, 0), (FILLET4_R, 0))
        make_face()
    fillet4_piece_13 = extrude(amount=18.48238525, mode=Mode.PRIVATE)
    fillet4_piece_13 = split(fillet4_piece_13, bisect_by=Plane(origin=(-10.215686034, -7.335922395, 6), z_dir=(0.8191520442889891, -0.5735764363510499, 0)), keep=Keep.TOP, mode=Mode.PRIVATE)
    fillet4_piece_13 = split(fillet4_piece_13, bisect_by=Plane(origin=(0, -5.056603329, 6), z_dir=(-1, 0, 0)), keep=Keep.TOP, mode=Mode.PRIVATE)
    add(fillet4_piece_13, mode=Mode.SUBTRACT)
    with BuildSketch(Plane(origin=(-13.124734081, -8.003579973, -7.5), x_dir=(0.5735764363510486, 0.8191520442889901, 0), z_dir=(0.8191520442889901, -0.5735764363510486, 0)), Plane(origin=(-13.124734081, -8.003579973, 7.5), x_dir=(0, 0, -1), z_dir=(0.8191520442889901, -0.5735764363510486, 0))) as fillet4_piece_14:
        with BuildLine():
            CenterArc((FILLET4_R, FILLET4_R), FILLET4_R, 180, 90)
            Line((0, FILLET4_R), (0, 0))
            Line((0, 0), (FILLET4_R, 0))
        make_face()
    extrude(amount=7, mode=Mode.SUBTRACT)

    # Fillet5
    fillet5_edges = [part_2.edges().sort_by_distance(p)[0] for p in [
        (-10.544405141, -9.810345748, 0),
    ]]
    fillet(fillet5_edges, radius=FILLET5_R)


solid = part_2.part
